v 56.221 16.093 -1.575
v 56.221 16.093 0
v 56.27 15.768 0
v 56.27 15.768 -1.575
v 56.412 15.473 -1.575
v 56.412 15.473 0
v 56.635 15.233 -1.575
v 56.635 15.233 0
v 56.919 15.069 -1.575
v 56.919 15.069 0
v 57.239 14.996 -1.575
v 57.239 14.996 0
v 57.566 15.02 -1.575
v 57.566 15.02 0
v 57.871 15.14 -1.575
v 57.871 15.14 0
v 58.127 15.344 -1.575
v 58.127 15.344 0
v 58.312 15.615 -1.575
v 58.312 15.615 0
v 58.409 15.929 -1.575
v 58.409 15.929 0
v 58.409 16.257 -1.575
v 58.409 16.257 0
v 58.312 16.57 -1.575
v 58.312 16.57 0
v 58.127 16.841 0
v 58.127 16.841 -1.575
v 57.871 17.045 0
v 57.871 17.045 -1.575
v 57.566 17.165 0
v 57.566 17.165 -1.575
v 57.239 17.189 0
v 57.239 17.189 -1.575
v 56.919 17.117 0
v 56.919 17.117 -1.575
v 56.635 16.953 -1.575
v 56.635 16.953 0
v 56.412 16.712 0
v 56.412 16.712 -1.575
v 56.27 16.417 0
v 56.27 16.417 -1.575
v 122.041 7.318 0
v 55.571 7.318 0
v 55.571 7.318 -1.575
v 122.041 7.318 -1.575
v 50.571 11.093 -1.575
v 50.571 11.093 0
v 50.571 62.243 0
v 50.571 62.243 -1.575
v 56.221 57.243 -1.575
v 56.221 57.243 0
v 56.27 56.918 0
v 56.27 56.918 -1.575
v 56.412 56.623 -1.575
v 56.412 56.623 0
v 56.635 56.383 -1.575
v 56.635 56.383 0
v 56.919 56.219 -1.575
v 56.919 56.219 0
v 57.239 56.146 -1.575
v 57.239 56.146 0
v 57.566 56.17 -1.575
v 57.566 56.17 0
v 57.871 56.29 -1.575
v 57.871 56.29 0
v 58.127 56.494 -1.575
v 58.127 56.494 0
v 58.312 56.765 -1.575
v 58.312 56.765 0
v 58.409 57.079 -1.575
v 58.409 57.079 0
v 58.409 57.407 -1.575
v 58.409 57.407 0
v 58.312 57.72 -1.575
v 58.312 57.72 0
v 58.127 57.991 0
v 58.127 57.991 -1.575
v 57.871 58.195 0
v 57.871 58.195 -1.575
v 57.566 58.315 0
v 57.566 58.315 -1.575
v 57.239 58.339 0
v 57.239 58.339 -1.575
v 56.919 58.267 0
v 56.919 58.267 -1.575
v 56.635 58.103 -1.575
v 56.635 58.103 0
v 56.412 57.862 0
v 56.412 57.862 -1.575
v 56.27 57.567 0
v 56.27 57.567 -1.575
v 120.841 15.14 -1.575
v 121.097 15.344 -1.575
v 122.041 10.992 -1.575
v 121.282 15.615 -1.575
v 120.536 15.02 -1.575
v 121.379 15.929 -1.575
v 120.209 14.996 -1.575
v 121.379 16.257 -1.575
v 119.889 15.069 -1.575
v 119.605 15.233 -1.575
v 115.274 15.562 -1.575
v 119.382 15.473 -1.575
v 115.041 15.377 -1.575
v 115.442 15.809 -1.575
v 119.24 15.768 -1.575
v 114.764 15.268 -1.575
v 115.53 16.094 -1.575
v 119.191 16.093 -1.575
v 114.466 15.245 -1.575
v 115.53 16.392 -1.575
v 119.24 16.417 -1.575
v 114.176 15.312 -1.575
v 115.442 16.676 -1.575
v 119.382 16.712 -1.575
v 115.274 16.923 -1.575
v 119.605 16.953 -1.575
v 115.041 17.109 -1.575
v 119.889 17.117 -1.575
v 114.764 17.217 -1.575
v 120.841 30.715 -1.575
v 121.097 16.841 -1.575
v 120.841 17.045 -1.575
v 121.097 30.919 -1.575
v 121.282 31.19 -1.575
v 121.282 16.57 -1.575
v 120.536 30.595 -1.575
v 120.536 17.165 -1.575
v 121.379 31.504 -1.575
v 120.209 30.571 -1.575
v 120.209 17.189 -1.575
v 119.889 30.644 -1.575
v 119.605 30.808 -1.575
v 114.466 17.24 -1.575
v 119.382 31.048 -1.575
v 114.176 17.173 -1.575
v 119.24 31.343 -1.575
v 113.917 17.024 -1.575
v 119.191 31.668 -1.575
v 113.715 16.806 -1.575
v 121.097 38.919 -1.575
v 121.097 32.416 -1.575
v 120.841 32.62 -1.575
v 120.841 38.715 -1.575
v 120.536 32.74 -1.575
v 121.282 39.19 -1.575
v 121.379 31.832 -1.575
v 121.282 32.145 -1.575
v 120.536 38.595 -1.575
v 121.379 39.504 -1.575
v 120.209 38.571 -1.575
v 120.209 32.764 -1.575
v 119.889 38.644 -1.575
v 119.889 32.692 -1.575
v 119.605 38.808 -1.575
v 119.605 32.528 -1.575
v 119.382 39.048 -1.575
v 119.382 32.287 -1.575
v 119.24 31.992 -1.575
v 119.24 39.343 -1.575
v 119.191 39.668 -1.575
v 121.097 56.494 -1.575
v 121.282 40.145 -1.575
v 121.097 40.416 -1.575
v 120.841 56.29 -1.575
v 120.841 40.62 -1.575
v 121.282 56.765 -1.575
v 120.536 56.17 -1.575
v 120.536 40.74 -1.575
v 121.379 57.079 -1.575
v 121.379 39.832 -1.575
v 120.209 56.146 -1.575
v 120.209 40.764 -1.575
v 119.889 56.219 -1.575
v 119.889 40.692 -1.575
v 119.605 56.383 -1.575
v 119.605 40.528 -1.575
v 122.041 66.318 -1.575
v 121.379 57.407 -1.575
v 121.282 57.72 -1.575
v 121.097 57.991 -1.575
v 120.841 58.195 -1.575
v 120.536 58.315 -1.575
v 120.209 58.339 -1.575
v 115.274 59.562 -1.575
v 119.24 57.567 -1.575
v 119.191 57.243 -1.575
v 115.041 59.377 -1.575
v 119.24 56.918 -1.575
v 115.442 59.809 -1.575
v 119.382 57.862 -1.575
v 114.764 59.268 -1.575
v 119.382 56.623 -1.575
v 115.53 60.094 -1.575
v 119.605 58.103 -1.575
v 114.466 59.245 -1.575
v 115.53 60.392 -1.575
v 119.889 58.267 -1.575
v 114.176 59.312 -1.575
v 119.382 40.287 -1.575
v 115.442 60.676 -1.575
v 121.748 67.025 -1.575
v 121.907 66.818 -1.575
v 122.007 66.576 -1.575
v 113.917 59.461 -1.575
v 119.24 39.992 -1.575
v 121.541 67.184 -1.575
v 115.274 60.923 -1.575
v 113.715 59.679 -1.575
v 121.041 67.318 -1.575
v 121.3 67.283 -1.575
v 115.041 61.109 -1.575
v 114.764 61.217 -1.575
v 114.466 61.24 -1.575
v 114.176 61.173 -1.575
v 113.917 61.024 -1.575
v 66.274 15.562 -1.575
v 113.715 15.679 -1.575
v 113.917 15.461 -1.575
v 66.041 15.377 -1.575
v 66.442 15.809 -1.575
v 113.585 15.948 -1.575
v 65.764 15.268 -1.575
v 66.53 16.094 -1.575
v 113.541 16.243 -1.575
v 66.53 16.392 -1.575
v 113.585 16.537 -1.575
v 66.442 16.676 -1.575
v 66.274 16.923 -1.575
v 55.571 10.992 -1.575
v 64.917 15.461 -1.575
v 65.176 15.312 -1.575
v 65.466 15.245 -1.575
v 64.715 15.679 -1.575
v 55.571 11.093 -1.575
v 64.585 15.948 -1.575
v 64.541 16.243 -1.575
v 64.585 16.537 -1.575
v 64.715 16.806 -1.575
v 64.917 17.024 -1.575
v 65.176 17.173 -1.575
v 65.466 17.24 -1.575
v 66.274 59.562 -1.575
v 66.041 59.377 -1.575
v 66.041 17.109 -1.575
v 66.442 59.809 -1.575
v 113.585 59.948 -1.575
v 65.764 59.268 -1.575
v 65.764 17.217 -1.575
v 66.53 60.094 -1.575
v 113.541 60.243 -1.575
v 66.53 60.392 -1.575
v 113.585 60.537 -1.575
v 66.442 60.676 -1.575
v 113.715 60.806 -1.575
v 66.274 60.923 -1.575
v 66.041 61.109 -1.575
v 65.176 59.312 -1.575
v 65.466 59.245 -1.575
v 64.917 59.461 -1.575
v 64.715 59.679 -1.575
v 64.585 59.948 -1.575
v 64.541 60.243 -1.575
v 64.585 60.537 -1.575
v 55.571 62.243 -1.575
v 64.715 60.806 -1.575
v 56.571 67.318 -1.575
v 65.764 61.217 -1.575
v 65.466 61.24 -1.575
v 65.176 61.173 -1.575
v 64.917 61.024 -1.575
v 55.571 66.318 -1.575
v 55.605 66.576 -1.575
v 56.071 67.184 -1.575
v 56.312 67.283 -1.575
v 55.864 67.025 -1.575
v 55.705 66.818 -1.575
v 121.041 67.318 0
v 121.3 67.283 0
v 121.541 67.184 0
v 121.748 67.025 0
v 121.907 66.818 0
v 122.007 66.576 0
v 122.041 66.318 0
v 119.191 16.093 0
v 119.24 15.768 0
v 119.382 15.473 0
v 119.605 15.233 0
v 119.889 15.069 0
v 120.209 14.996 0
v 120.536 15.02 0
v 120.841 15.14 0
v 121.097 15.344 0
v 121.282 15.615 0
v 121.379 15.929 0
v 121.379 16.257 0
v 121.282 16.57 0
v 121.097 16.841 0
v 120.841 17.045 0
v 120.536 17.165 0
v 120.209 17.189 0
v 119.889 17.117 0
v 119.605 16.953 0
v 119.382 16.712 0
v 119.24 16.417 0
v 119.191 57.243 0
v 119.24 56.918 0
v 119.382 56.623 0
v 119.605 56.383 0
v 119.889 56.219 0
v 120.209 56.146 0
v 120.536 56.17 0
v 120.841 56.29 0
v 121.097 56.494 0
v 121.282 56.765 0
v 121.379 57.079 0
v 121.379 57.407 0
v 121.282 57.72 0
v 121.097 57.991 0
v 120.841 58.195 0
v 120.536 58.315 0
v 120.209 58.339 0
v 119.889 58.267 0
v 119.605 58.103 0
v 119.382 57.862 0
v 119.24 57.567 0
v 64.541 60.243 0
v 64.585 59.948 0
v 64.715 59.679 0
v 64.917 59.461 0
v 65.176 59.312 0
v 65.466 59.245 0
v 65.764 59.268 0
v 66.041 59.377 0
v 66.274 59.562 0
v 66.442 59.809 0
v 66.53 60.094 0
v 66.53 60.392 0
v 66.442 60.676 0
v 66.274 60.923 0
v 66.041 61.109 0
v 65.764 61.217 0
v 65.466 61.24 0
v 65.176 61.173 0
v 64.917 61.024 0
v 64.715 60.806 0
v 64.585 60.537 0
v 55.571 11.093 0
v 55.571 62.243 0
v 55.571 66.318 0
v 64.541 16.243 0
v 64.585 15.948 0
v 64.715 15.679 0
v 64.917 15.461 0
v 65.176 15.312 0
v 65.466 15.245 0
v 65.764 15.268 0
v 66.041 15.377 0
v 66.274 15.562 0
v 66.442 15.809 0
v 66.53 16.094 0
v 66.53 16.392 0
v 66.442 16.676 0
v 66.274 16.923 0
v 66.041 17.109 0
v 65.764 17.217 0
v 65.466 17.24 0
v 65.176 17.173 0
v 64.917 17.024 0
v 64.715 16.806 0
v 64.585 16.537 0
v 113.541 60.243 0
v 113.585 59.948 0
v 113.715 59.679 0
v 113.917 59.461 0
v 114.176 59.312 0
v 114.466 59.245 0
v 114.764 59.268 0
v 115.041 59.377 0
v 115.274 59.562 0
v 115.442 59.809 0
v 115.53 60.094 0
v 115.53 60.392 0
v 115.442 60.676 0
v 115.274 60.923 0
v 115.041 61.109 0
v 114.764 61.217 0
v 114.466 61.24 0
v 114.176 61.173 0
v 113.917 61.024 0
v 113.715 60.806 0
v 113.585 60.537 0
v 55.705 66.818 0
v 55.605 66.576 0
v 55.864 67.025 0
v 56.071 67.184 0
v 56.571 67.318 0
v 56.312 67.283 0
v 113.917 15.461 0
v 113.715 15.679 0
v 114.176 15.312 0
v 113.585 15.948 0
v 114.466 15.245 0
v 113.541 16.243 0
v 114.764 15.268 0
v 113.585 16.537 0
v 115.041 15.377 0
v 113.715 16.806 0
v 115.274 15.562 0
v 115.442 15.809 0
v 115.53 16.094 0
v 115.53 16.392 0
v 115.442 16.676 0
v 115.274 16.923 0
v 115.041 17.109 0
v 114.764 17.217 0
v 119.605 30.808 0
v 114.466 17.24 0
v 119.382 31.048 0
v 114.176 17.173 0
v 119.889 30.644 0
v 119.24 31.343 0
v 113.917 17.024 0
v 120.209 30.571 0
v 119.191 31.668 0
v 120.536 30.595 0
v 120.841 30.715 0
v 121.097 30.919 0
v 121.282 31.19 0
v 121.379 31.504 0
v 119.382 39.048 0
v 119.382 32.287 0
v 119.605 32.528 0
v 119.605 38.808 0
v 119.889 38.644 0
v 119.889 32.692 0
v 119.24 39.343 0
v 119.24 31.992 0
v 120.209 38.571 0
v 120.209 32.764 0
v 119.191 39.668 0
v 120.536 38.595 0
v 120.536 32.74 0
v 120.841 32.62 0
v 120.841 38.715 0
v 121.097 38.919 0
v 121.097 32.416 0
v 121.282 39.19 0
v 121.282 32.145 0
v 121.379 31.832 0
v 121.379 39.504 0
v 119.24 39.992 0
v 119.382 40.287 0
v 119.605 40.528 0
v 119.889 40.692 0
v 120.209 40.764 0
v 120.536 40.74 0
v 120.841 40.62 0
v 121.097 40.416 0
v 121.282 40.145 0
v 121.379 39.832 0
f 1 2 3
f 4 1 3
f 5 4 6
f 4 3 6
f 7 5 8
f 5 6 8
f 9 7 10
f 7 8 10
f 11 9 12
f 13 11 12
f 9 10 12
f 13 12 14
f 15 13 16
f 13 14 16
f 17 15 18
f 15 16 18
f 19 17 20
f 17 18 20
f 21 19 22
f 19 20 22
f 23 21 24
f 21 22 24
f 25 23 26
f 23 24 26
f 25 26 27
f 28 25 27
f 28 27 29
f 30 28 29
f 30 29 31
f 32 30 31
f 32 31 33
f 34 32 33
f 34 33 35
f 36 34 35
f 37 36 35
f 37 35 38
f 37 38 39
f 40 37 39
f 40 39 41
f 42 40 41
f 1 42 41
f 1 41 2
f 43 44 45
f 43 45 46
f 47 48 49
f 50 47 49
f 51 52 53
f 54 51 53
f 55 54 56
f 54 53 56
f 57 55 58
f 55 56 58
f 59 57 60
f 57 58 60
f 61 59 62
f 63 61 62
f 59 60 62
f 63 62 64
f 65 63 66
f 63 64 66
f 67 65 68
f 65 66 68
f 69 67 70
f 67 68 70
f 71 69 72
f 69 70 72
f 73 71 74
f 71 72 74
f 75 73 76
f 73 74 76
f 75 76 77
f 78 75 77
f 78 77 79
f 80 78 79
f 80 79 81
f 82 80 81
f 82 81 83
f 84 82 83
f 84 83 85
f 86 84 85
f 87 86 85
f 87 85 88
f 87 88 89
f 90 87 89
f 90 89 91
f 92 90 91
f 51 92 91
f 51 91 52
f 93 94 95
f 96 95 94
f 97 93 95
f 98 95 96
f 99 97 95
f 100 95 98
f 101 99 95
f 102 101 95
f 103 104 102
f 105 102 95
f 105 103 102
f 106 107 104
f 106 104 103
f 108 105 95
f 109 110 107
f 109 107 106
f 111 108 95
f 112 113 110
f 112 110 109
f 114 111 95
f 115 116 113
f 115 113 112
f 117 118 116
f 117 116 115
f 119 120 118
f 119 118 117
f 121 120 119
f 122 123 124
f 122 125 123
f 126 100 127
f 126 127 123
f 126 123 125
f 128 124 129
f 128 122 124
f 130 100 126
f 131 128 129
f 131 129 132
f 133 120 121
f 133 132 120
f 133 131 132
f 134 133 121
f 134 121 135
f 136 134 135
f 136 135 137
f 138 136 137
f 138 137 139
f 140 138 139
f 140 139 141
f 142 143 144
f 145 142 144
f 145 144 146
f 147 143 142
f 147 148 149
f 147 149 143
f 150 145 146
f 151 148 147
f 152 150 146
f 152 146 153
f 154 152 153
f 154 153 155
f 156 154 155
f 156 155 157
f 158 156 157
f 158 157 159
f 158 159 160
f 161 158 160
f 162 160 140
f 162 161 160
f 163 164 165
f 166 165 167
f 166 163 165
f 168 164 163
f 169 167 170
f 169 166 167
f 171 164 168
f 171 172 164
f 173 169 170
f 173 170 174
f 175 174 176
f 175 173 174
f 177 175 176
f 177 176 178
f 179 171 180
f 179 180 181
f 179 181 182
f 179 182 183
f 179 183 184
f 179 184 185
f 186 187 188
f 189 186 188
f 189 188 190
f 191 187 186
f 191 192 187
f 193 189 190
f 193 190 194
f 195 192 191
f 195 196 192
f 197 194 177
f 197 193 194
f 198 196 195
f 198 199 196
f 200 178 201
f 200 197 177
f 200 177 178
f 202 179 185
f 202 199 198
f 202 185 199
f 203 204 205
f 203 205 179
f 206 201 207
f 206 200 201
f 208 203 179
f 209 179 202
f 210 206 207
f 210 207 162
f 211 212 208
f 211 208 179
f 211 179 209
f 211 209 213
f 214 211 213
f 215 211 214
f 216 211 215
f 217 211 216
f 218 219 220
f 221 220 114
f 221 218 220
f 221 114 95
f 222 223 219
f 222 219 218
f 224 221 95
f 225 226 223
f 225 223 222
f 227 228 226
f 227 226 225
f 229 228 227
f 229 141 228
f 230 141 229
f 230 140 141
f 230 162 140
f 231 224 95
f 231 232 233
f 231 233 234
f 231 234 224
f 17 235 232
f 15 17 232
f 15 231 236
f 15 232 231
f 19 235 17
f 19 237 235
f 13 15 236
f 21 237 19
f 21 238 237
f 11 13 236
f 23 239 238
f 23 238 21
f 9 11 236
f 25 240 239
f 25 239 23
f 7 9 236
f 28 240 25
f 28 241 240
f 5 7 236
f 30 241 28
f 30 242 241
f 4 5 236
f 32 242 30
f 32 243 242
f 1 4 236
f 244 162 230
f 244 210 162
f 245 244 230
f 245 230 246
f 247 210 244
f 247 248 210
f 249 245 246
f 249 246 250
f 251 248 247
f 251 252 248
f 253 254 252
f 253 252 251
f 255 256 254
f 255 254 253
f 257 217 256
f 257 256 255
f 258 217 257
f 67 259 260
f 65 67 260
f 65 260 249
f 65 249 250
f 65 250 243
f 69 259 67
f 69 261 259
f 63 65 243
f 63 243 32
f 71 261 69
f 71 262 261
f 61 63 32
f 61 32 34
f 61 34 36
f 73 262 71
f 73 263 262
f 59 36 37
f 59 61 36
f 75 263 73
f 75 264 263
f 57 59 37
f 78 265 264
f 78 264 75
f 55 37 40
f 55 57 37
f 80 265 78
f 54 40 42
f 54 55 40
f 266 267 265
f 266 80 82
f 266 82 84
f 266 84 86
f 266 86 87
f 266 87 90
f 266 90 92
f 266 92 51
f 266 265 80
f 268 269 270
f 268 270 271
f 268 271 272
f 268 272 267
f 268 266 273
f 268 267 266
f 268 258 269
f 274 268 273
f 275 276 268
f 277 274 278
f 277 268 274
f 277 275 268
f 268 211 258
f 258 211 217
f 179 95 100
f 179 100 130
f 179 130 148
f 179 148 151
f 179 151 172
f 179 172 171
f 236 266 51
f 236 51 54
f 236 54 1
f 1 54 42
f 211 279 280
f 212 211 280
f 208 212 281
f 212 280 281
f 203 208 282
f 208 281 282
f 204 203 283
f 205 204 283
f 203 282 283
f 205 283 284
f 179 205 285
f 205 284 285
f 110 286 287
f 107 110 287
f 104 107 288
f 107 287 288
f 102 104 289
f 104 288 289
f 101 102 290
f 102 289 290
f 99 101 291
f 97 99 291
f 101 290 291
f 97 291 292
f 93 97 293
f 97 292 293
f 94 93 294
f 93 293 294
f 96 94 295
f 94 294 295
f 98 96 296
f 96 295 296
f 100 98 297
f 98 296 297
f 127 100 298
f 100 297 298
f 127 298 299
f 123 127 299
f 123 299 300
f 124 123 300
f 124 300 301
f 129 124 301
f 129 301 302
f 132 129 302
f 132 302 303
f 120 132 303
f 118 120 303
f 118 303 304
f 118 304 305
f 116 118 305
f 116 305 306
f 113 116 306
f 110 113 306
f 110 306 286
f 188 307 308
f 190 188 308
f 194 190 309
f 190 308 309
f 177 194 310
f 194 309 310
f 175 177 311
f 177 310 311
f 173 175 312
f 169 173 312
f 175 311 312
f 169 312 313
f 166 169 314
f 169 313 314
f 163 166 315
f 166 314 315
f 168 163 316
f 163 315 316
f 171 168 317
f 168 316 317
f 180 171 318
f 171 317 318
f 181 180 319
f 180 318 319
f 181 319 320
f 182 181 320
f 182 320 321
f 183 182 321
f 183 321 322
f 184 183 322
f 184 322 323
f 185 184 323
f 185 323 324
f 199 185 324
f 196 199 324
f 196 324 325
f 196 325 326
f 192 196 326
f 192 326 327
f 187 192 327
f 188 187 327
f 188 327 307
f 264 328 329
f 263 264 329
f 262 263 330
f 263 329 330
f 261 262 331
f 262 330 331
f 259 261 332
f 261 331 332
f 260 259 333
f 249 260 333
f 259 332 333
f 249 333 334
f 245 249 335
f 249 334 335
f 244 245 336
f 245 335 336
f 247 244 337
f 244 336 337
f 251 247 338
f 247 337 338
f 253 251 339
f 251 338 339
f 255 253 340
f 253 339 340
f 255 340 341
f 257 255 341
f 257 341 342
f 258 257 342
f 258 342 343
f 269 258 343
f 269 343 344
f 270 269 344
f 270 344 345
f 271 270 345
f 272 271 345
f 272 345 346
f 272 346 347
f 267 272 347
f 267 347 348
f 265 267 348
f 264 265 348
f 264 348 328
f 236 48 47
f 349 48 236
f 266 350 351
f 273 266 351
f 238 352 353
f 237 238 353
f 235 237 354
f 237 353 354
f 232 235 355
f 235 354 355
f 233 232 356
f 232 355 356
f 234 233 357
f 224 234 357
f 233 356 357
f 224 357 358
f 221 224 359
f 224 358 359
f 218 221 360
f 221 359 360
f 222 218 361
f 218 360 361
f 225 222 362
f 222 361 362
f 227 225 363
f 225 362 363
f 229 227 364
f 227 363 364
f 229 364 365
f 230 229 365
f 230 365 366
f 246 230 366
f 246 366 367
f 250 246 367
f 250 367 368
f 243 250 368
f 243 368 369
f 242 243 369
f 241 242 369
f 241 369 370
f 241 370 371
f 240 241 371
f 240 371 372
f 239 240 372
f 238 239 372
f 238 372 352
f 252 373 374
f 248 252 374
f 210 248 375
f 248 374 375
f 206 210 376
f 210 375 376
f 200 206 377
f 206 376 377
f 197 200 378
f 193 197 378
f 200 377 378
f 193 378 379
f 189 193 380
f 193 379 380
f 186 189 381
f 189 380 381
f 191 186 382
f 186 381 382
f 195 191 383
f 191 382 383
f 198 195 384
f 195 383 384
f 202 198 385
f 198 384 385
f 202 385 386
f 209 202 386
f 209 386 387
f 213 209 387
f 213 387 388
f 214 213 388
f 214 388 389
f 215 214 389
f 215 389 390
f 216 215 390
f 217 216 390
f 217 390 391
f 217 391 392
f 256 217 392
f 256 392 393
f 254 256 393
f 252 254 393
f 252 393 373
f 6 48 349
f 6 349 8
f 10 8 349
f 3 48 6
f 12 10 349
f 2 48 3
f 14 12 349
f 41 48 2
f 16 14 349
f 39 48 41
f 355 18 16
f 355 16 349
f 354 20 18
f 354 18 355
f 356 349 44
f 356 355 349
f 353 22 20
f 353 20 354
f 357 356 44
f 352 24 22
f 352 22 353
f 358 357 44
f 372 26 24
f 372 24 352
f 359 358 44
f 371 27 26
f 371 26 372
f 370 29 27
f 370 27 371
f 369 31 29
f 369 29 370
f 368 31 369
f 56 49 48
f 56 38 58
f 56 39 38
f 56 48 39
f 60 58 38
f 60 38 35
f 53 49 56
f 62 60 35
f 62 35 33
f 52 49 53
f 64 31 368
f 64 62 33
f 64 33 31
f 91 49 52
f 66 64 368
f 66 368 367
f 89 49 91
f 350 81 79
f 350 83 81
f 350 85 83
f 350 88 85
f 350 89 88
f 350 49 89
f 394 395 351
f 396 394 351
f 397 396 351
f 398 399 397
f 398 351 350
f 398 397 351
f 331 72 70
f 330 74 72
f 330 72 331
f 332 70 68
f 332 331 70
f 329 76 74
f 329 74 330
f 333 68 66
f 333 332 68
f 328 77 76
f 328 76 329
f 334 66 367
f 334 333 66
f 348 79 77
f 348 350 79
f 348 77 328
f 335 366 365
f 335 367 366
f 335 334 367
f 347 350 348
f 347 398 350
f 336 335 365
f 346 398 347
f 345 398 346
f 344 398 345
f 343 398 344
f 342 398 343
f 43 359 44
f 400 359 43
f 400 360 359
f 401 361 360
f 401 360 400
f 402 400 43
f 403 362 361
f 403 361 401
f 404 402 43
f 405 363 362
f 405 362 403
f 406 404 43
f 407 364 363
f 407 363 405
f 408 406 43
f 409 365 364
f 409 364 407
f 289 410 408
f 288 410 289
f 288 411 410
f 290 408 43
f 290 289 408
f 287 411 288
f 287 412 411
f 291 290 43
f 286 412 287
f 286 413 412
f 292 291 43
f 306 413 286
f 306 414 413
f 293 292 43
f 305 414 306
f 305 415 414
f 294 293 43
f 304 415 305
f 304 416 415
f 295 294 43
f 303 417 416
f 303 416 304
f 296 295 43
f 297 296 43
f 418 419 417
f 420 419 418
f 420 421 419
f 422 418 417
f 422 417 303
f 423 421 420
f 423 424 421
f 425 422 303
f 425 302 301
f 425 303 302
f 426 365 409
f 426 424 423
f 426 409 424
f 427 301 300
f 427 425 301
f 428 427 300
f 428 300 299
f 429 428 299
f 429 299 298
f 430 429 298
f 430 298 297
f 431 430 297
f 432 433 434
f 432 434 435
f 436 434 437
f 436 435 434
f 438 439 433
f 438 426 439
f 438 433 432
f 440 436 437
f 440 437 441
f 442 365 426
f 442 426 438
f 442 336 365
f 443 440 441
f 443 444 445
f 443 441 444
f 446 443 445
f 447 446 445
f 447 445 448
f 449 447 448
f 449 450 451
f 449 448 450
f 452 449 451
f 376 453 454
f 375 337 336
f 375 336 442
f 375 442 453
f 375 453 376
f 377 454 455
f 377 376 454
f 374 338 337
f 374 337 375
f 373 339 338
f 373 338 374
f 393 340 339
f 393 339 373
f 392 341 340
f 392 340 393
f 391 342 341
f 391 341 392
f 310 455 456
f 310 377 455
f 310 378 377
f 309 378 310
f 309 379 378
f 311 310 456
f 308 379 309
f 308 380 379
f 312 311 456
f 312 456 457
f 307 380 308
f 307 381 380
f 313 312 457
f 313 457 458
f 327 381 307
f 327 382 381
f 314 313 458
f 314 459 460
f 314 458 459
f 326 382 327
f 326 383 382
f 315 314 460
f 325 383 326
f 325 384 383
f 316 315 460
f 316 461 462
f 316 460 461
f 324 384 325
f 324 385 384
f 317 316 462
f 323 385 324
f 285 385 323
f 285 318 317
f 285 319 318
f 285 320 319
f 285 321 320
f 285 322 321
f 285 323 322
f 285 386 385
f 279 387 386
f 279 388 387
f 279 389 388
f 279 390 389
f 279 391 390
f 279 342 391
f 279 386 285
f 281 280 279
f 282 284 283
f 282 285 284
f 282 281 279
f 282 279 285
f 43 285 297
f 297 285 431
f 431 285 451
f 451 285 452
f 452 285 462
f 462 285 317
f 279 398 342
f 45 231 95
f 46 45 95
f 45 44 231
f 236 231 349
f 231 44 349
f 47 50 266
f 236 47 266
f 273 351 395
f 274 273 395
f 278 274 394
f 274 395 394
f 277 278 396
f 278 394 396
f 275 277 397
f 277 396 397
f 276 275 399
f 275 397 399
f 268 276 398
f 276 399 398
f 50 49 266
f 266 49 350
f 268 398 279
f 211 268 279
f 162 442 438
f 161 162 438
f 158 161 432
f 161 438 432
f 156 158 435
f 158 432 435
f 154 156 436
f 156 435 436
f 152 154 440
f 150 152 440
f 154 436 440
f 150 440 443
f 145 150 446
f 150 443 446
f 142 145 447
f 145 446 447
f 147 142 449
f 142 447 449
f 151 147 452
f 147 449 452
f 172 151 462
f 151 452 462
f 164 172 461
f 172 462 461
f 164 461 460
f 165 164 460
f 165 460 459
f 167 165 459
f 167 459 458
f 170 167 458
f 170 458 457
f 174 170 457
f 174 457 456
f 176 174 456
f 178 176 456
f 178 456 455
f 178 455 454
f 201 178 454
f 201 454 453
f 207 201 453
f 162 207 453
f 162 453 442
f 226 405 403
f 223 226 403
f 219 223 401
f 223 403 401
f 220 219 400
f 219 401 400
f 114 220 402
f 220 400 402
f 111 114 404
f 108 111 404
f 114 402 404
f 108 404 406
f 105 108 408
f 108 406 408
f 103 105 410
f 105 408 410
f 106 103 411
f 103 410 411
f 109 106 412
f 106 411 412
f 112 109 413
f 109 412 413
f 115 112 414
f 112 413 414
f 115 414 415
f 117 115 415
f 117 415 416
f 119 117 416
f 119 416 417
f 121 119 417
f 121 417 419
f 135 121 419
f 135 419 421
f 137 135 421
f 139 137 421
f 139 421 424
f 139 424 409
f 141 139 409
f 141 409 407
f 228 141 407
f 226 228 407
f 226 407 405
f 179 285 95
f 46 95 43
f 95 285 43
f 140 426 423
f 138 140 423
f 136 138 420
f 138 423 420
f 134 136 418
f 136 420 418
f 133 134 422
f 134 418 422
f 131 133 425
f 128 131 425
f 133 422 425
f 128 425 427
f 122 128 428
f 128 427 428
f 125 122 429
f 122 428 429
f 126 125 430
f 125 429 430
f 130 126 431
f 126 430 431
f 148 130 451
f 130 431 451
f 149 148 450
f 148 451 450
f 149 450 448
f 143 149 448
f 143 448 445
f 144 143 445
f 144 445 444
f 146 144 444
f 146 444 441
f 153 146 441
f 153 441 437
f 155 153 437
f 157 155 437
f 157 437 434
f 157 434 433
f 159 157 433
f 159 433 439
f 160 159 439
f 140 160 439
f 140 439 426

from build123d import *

# Parameters (mm, degrees)
BOSS_EXTRUDE1_DEPTH   = 1.5748
SKETCH10_W            = 66.47
SKETCH10_H            = 4.17478322
BOSS_EXTRUDE3_DEPTH   = 1.575
SKETCH11_W            = 66.47
SKETCH11_H            = 0.5
CUT_EXTRUDE2_DEPTH    = 140.38485176
M2_CLEARANCE_HOLE1_D  = 2.2
F_2_0MM_DOWEL_HOLE1_D = 2
SKETCH12_W            = 5
SKETCH12_H            = 51.15
BOSS_EXTRUDE4_DEPTH   = 1.575


with BuildPart() as part:
    # BPR2 PCB Outline → Boss-Extrude1 (new body)
    with BuildSketch(Plane.XY):
        with BuildLine():
            Line((56.570984325, 67.317563979), (121.040984325, 67.317563979))
            ThreePointArc((121.040984325, 67.317563979), (121.748091106, 67.02467076), (122.040984325, 66.317563979))
            Line((122.040984325, 66.317563979), (122.040984325, 7.817563979))
            ThreePointArc((122.040984325, 7.817563979), (121.748091106, 7.110457198), (121.040984325, 6.817563979))
            Line((121.040984325, 6.817563979), (103.596984325, 6.817563979))
            Line((103.596984325, 6.817563979), (83.596984325, 6.817563979))
            Line((83.596984325, 6.817563979), (55.570984325, 6.817563979))
            Line((55.570984325, 6.817563979), (55.570984325, 66.317563979))
            ThreePointArc((55.570984325, 66.317563979), (55.863877543, 67.02467076), (56.570984325, 67.317563979))
        make_face()
    extrude(amount=-BOSS_EXTRUDE1_DEPTH)

    # Sketch10 → Boss-Extrude3 (add)
    with BuildSketch(Plane.XY):
        with Locations((88.805984325, 8.904955589)):
            Rectangle(SKETCH10_W, SKETCH10_H)
    extrude(amount=-BOSS_EXTRUDE3_DEPTH)

    # Sketch11 → Cut-Extrude2 (cut, through all)
    with BuildSketch(Plane.XY):
        with Locations((88.805984325, 7.067563979)):
            Rectangle(SKETCH11_W, SKETCH11_H)
    extrude(amount=-CUT_EXTRUDE2_DEPTH, mode=Mode.SUBTRACT)

    # M2 Clearance Hole1 (through all)
    with Locations(Plane(origin=(39.260906477, 104.204612391, -6.5748), x_dir=(1, 0, 0), z_dir=(0, 0, -1))):
        with Locations((81.030077848, 88.112048412), (81.030077848, 72.537048412), (81.030077848, 64.537048412), (81.030077848, 46.962048412), (18.060077848, 46.962048412), (18.060077848, 88.112048412)):
            Hole(M2_CLEARANCE_HOLE1_D / 2)

    # Ø2.0mm Dowel Hole1 (through all)
    with Locations(Plane(origin=(39.260906477, 104.204612391, -4.6498), x_dir=(1, 0, 0), z_dir=(0, 0, -1))):
        with Locations((26.280077848, 87.962048412), (26.280077848, 43.962048412), (75.280077848, 43.962048412), (75.280077848, 87.962048412)):
            Hole(F_2_0MM_DOWEL_HOLE1_D / 2)

    # Sketch12 → Boss-Extrude4 (add, through all)
    with BuildSketch(Plane.XY):
        with Locations((53.070984325, 36.667563979)):
            Rectangle(SKETCH12_W, SKETCH12_H)
    extrude(amount=-BOSS_EXTRUDE4_DEPTH)


solid = part.part
